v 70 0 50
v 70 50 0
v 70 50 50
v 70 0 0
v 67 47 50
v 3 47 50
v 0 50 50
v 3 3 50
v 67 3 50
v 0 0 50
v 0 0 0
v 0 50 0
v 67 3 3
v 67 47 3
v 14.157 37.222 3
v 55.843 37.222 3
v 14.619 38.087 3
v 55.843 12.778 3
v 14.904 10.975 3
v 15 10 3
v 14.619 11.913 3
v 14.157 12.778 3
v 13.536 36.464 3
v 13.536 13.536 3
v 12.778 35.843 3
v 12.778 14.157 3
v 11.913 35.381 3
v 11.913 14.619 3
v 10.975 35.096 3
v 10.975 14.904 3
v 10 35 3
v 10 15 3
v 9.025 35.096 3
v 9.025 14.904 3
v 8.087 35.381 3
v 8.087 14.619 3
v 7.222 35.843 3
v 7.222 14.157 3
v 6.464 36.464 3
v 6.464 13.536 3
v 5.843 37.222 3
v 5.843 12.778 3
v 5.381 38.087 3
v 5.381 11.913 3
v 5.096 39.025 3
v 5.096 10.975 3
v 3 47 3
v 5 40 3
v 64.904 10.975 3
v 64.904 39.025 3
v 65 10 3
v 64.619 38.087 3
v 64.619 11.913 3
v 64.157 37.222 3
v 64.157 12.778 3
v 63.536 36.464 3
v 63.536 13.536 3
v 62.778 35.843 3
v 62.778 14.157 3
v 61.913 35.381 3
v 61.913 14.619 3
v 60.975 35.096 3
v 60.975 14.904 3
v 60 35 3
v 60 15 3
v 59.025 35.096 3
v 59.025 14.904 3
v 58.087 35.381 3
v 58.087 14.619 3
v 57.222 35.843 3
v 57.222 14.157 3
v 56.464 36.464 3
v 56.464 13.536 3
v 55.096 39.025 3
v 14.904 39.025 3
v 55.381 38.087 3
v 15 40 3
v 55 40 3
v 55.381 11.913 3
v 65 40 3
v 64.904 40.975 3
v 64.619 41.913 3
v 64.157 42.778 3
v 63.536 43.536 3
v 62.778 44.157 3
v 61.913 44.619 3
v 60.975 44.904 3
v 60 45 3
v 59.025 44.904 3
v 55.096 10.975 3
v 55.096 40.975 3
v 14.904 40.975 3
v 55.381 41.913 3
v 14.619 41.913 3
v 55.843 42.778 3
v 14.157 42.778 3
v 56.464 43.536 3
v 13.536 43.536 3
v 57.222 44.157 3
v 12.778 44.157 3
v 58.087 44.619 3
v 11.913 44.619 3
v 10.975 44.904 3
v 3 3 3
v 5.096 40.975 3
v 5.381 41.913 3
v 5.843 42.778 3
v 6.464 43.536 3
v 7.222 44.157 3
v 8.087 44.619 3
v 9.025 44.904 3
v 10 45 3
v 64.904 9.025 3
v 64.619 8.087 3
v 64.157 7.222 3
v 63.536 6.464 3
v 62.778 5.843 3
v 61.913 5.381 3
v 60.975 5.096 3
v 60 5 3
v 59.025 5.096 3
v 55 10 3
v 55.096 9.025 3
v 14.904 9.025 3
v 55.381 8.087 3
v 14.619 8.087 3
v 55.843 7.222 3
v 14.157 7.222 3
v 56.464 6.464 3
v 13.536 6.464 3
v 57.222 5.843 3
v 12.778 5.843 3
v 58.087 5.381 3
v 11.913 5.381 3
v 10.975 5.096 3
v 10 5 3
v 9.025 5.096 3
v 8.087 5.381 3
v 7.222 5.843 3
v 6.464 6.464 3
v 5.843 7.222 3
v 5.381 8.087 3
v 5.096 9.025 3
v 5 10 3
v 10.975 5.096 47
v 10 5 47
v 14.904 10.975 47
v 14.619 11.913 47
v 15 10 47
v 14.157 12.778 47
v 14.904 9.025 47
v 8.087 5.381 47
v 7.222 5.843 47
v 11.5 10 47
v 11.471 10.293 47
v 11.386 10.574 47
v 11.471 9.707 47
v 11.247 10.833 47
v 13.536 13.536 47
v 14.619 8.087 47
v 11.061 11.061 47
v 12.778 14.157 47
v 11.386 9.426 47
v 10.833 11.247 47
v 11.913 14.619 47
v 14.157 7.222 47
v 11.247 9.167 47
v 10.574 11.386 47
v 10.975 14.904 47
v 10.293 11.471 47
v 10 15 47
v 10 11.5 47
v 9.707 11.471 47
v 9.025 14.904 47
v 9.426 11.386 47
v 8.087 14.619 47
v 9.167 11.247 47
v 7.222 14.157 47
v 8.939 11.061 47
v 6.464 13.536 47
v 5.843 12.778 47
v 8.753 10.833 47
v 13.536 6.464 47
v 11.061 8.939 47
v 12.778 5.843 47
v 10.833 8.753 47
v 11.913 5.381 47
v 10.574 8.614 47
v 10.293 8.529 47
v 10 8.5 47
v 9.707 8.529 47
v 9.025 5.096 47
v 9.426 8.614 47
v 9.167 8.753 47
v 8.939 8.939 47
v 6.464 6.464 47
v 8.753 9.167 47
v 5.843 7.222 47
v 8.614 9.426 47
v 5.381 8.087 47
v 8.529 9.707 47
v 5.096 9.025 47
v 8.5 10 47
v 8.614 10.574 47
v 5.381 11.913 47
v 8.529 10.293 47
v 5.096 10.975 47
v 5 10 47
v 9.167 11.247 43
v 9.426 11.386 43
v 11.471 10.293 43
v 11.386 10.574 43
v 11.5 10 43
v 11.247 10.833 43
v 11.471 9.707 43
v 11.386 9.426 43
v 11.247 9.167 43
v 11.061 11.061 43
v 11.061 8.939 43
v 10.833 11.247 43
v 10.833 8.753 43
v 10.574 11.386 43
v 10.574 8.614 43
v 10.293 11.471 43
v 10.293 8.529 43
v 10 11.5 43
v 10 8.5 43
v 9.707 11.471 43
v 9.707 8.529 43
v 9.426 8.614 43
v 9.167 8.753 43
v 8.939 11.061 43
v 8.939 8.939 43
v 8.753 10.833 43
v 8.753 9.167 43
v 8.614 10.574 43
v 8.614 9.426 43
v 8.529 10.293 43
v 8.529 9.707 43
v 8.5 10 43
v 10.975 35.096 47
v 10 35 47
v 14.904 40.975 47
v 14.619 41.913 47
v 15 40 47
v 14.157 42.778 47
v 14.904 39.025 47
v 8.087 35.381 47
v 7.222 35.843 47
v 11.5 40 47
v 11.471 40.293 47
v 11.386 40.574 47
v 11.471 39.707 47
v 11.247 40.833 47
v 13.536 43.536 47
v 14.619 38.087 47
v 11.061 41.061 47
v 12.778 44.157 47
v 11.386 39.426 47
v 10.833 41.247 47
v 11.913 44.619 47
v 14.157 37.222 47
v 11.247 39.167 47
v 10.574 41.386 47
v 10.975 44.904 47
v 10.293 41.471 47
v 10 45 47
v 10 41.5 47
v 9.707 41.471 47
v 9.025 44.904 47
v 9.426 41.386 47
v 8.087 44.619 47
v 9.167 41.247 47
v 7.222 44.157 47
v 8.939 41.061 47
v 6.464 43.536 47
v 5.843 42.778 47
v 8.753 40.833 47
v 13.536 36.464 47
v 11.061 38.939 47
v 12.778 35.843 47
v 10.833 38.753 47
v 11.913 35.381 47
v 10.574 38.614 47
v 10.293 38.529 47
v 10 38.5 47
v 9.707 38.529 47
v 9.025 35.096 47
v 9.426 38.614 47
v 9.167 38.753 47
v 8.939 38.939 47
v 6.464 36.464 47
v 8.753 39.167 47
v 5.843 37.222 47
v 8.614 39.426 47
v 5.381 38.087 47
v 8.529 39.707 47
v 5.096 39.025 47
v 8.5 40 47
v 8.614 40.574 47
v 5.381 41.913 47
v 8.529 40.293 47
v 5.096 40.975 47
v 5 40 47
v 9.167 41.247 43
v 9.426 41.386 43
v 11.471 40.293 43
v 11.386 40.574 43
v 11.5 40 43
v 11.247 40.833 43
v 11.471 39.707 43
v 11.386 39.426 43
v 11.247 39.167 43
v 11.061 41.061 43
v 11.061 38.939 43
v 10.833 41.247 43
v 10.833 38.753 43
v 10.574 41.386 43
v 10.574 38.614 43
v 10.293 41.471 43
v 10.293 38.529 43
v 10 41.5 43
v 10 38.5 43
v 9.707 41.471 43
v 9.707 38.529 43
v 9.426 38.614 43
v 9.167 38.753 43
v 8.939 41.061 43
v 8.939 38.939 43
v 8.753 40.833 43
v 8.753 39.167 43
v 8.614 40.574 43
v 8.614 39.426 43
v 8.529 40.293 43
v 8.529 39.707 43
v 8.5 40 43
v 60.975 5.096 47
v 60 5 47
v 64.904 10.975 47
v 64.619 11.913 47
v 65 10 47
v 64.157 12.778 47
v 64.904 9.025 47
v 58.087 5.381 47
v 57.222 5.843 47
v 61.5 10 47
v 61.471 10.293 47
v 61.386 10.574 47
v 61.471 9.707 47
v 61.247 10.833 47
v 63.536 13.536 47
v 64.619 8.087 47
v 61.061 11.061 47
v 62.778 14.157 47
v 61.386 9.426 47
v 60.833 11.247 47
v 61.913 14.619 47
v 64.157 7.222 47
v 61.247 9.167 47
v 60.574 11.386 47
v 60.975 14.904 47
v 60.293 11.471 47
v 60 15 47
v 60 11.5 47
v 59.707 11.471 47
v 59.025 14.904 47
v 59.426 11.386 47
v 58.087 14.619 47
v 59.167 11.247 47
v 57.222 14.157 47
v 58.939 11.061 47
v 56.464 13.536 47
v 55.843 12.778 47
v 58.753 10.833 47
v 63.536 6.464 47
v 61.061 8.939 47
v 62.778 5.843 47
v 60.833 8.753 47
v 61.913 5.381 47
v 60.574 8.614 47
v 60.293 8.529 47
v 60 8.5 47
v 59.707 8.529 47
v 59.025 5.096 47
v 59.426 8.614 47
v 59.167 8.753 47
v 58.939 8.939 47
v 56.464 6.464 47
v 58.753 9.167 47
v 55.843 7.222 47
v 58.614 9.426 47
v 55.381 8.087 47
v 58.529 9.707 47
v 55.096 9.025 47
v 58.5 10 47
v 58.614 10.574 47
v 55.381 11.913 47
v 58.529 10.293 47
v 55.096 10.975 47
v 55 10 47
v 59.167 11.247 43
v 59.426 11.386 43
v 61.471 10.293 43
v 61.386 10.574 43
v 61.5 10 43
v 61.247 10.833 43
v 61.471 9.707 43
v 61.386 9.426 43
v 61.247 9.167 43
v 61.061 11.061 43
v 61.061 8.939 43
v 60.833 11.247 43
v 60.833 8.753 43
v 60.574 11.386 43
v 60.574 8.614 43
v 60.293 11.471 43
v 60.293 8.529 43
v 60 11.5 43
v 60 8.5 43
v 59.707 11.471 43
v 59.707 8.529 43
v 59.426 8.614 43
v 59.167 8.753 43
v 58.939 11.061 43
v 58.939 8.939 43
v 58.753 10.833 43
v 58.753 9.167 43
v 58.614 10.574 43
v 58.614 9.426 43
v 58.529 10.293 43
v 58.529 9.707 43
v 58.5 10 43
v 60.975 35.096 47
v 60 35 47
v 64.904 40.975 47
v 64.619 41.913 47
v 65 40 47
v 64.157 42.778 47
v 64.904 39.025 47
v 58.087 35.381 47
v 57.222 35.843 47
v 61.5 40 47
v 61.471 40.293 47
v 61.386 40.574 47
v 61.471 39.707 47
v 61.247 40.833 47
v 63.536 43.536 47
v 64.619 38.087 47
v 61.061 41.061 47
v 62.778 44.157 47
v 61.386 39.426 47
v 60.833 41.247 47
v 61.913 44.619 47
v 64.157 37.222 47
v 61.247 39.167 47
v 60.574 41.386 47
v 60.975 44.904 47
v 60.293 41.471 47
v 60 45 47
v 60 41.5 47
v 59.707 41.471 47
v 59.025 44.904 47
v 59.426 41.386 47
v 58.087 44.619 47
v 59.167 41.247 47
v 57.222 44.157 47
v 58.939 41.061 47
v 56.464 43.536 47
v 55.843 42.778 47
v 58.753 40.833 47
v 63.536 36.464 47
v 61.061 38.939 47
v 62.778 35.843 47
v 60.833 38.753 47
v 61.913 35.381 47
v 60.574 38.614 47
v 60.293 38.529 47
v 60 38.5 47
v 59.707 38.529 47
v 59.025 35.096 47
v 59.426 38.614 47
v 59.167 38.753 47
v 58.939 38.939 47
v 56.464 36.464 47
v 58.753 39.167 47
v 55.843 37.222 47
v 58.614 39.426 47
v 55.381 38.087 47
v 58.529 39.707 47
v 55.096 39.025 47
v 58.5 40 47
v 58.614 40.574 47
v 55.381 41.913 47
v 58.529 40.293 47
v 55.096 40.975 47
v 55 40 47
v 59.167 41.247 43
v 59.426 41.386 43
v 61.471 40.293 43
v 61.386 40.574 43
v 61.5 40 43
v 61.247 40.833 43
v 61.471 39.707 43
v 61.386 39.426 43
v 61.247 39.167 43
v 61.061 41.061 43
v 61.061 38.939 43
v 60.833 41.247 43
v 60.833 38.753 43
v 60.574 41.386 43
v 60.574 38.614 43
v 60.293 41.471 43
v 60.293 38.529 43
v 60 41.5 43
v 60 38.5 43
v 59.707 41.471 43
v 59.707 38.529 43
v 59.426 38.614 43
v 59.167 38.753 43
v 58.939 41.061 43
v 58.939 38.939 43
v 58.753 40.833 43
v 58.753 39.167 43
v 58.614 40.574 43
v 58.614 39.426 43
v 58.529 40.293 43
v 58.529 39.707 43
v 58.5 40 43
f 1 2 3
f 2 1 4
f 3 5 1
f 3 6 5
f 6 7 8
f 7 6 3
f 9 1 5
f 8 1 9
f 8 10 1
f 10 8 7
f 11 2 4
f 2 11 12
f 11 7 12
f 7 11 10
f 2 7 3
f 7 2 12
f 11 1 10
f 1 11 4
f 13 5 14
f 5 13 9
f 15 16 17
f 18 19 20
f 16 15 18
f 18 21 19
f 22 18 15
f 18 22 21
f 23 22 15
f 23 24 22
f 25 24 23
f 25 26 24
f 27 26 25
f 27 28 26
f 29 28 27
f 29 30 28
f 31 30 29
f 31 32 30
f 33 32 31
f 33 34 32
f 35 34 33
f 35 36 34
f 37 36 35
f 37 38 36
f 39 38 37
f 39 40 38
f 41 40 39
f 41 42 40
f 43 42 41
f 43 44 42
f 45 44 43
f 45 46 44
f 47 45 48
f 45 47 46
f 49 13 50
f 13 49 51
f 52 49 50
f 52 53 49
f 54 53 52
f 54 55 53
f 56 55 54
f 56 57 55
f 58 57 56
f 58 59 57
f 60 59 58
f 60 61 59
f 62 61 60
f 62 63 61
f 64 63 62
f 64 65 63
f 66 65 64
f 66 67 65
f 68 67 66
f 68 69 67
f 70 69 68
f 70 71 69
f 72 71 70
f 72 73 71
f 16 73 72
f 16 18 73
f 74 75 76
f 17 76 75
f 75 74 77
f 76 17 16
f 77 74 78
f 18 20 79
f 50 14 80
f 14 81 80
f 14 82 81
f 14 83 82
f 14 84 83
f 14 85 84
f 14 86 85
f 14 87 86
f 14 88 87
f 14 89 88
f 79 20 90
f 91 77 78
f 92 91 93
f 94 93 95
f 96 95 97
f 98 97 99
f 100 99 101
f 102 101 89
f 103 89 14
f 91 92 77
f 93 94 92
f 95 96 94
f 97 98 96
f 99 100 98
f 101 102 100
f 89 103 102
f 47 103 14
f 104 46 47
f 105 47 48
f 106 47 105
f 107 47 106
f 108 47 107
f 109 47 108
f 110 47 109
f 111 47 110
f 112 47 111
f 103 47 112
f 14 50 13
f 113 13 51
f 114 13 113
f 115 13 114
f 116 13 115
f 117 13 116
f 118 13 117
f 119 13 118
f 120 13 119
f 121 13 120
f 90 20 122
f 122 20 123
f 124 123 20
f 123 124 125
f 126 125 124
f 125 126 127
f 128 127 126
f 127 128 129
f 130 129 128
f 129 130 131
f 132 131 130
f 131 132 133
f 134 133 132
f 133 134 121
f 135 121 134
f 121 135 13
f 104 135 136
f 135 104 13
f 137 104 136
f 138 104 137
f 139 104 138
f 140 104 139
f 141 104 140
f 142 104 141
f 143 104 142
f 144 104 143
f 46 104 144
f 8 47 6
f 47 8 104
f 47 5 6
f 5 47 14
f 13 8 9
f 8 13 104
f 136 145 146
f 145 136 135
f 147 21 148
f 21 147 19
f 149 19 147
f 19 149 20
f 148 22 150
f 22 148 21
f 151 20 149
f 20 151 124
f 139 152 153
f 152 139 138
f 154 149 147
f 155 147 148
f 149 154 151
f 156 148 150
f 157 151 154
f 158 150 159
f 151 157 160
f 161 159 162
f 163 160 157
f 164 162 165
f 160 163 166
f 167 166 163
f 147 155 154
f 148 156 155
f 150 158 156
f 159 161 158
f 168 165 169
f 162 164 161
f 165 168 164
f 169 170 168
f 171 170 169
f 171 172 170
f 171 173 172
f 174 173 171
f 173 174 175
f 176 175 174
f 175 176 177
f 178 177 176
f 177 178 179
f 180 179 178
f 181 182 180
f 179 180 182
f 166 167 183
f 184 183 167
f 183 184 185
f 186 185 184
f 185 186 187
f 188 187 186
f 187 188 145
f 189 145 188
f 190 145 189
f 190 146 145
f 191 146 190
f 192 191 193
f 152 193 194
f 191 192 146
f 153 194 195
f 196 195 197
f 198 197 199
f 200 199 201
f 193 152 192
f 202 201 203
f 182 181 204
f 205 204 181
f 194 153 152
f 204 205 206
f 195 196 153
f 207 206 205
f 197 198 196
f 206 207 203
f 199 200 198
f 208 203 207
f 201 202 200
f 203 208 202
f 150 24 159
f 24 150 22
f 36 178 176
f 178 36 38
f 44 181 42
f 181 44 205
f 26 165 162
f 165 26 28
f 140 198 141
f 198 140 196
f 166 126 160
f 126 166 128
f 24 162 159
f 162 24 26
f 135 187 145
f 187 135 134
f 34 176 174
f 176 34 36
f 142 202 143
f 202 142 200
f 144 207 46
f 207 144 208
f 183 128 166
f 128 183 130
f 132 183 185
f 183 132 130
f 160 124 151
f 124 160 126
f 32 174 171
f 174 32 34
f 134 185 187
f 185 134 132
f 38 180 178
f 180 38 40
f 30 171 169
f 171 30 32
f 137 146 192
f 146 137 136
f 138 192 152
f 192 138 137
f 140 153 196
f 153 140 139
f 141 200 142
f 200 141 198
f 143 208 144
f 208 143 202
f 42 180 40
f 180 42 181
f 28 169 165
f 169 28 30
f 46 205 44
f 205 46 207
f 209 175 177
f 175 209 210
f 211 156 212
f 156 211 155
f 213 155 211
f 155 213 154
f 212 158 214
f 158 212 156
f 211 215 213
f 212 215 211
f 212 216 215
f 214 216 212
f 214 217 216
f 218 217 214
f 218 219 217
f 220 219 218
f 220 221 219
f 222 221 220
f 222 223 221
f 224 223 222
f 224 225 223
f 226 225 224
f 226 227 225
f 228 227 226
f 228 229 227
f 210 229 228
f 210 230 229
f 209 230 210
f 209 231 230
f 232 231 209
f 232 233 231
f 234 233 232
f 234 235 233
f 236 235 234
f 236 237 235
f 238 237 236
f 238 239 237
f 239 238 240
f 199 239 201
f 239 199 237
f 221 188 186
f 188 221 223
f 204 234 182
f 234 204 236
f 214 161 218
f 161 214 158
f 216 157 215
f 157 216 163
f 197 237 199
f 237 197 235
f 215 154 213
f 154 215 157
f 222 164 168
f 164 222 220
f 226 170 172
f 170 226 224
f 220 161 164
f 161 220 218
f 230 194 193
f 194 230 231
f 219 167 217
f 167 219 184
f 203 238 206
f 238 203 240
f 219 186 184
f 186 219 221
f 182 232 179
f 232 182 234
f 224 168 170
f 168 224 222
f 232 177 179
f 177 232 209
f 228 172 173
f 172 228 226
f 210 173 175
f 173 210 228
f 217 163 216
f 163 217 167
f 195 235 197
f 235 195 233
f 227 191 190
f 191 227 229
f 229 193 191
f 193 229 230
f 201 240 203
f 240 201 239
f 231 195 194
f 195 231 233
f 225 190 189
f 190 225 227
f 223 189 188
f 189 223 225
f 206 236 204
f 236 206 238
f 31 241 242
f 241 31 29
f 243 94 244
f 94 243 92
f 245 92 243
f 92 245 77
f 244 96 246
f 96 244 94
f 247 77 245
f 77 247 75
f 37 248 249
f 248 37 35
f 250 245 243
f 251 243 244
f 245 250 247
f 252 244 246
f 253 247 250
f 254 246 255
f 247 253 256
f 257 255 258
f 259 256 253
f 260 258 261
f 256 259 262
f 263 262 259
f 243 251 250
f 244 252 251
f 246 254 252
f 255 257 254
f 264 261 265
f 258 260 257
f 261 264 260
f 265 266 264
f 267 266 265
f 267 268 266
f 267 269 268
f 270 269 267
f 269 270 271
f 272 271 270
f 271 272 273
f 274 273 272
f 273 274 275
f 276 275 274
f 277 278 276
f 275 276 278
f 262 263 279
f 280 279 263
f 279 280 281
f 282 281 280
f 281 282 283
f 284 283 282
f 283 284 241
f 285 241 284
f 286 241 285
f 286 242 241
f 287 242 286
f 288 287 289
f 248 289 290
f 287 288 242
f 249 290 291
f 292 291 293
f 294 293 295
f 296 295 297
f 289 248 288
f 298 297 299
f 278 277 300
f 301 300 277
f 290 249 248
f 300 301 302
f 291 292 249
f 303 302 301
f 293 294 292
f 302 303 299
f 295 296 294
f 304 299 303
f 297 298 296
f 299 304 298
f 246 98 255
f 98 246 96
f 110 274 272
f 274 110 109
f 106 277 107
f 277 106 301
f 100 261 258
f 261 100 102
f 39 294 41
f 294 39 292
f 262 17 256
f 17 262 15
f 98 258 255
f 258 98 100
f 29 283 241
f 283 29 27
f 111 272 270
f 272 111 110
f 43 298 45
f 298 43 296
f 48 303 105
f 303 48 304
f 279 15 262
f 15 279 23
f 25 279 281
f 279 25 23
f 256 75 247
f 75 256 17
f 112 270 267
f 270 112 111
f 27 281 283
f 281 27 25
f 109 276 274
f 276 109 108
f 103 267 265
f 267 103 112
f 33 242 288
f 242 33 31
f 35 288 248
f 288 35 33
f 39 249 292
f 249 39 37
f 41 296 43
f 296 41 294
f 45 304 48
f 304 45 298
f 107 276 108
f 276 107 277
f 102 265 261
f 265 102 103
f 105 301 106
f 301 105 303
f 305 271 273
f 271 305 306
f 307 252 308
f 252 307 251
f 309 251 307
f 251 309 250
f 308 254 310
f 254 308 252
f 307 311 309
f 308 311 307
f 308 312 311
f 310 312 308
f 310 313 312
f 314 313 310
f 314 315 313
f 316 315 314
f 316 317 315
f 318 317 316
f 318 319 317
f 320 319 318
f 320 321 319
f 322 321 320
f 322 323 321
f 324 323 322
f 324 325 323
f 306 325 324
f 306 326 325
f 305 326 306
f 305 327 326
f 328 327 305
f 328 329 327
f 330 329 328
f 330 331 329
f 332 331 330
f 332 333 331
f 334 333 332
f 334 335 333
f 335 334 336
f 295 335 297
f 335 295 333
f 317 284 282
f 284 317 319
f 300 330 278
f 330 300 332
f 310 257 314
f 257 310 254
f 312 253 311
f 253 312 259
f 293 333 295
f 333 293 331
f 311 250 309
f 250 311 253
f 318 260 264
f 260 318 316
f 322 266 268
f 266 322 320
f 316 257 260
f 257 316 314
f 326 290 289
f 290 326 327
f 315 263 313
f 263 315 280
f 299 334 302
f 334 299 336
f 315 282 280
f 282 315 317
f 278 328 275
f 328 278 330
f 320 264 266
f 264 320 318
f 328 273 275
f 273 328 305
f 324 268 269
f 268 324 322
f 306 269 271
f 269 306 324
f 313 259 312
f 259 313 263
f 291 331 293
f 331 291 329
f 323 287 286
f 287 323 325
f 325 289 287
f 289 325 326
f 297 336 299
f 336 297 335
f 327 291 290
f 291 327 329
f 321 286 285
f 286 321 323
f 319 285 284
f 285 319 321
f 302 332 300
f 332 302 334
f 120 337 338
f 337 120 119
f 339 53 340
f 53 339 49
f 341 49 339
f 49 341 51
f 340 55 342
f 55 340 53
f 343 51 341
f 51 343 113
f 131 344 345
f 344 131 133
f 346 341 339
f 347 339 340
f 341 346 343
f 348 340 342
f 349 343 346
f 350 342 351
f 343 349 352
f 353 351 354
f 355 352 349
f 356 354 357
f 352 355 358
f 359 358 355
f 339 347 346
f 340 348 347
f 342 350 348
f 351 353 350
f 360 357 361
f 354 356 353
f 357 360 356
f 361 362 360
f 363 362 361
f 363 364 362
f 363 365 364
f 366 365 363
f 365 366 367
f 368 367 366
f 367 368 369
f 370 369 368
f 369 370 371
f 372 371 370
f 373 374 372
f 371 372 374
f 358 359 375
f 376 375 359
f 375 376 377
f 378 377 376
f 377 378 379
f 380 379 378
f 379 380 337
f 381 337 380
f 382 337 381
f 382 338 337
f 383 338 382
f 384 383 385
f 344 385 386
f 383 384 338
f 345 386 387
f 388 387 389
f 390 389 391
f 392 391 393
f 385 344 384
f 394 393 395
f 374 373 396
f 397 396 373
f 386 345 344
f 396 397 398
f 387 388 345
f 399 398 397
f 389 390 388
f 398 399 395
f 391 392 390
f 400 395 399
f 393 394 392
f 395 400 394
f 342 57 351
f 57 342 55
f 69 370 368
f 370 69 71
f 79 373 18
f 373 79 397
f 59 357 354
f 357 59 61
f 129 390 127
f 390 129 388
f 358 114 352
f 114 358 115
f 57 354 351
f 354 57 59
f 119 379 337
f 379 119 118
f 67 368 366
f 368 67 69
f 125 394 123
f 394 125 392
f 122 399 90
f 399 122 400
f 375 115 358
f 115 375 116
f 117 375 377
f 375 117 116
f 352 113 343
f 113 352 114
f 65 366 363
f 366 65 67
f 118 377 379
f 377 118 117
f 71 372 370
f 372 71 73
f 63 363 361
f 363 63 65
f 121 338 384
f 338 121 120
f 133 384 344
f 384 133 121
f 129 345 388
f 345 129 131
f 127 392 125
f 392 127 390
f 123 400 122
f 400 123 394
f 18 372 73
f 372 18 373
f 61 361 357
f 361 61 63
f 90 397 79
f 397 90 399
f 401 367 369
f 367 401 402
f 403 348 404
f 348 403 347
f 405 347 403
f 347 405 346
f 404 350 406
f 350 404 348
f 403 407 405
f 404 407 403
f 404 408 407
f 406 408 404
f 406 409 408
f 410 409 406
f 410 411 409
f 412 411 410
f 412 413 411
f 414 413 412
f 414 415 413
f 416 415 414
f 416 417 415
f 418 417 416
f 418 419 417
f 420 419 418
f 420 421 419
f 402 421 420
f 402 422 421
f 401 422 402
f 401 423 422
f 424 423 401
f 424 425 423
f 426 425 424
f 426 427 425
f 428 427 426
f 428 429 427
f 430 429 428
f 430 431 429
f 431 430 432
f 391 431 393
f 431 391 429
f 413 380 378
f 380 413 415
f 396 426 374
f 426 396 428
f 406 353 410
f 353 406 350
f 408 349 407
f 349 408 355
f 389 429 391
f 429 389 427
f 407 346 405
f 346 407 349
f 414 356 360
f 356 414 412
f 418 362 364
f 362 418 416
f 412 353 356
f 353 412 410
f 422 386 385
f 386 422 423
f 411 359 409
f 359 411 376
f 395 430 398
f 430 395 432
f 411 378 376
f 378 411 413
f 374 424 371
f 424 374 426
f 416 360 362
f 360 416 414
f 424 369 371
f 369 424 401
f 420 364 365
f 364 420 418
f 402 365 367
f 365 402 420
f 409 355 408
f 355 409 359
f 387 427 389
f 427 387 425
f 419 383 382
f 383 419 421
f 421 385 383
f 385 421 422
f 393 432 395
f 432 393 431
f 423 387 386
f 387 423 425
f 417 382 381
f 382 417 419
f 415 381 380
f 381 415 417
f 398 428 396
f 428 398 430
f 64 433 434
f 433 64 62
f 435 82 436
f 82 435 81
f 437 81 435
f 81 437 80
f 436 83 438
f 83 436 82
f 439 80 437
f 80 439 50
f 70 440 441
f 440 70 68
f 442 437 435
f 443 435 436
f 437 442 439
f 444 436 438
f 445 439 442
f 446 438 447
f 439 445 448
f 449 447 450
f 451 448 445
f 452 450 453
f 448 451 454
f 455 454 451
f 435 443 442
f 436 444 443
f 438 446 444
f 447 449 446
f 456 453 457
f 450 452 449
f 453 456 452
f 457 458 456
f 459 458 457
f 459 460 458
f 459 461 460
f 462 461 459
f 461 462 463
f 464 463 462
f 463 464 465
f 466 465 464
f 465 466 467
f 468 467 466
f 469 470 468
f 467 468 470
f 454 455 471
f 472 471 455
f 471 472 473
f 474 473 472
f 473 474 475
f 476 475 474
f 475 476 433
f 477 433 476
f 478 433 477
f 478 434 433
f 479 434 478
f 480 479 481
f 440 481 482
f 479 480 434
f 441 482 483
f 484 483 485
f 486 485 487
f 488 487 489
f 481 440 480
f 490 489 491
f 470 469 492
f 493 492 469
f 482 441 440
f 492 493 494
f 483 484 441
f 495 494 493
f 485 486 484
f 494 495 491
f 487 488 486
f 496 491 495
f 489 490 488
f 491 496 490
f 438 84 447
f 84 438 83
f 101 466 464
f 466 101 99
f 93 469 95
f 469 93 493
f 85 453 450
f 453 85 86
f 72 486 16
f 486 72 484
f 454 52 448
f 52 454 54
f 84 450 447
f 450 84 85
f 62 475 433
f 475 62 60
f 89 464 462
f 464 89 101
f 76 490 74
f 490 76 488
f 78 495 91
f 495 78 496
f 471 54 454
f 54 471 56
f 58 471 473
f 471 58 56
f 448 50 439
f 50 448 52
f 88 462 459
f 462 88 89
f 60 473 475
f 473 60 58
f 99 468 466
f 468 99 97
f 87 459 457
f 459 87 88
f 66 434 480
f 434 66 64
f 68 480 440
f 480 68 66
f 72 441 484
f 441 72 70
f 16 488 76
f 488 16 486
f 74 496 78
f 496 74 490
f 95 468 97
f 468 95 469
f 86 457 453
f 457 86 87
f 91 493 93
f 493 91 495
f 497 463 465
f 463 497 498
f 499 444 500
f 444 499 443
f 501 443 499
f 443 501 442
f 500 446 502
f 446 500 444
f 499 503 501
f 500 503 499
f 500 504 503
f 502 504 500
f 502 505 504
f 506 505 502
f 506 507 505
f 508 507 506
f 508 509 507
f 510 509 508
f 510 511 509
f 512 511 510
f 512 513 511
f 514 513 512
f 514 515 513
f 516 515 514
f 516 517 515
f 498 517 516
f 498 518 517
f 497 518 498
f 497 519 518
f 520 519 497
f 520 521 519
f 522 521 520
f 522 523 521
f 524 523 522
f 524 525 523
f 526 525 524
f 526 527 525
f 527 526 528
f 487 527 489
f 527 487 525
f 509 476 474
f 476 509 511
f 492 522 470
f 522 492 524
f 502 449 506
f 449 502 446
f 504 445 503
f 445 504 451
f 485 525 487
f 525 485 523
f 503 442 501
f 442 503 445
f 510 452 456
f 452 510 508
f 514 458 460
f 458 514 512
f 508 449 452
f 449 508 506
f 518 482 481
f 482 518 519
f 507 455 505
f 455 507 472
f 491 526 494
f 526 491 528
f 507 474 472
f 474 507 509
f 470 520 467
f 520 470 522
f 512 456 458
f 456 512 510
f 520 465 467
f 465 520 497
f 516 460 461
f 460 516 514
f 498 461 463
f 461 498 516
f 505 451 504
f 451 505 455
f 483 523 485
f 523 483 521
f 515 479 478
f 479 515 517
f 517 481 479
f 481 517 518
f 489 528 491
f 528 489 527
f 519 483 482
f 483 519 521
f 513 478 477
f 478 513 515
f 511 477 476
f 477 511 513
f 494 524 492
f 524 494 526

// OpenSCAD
$fn = 32;

// ----------------------------------------------------------------------
// Enclosure box: bosses enclosure
// ----------------------------------------------------------------------

// --- parameters (mm) ---
box_l = 70;               // outer length, X
box_w = 50;               // outer width, Y
box_h = 50;               // outer height
wall_t = 3;               // wall thickness
boss_r = 5;               // corner boss radius
hole_r = 1.5;             // boss screw hole radius
boss_in = 10;             // boss inset from the corners
fit_tol = 0.02;           // tolerance for press fits, mm
free_tol = 0.2;           // tolerance for clearance fits, mm

inner_h = box_h - wall_t;  // cavity depth
boss_h = inner_h - 2;  // corner boss height

difference() {
  union() {
    difference() {
      cube([box_l, box_w, box_h]);
      translate([wall_t, wall_t, wall_t])
        cube([box_l - 2 * wall_t, box_w - 2 * wall_t, box_h]);
    }
    for (sx = [0, 1], sy = [0, 1])
      translate([sx ? box_l - boss_in : boss_in,
                 sy ? box_w - boss_in : boss_in, wall_t - 1])
        difference() {
          cylinder(r = boss_r, h = boss_h);
          translate([0, 0, boss_h - 4])
            cylinder(r = hole_r, h = 5);
        }
  }
}
